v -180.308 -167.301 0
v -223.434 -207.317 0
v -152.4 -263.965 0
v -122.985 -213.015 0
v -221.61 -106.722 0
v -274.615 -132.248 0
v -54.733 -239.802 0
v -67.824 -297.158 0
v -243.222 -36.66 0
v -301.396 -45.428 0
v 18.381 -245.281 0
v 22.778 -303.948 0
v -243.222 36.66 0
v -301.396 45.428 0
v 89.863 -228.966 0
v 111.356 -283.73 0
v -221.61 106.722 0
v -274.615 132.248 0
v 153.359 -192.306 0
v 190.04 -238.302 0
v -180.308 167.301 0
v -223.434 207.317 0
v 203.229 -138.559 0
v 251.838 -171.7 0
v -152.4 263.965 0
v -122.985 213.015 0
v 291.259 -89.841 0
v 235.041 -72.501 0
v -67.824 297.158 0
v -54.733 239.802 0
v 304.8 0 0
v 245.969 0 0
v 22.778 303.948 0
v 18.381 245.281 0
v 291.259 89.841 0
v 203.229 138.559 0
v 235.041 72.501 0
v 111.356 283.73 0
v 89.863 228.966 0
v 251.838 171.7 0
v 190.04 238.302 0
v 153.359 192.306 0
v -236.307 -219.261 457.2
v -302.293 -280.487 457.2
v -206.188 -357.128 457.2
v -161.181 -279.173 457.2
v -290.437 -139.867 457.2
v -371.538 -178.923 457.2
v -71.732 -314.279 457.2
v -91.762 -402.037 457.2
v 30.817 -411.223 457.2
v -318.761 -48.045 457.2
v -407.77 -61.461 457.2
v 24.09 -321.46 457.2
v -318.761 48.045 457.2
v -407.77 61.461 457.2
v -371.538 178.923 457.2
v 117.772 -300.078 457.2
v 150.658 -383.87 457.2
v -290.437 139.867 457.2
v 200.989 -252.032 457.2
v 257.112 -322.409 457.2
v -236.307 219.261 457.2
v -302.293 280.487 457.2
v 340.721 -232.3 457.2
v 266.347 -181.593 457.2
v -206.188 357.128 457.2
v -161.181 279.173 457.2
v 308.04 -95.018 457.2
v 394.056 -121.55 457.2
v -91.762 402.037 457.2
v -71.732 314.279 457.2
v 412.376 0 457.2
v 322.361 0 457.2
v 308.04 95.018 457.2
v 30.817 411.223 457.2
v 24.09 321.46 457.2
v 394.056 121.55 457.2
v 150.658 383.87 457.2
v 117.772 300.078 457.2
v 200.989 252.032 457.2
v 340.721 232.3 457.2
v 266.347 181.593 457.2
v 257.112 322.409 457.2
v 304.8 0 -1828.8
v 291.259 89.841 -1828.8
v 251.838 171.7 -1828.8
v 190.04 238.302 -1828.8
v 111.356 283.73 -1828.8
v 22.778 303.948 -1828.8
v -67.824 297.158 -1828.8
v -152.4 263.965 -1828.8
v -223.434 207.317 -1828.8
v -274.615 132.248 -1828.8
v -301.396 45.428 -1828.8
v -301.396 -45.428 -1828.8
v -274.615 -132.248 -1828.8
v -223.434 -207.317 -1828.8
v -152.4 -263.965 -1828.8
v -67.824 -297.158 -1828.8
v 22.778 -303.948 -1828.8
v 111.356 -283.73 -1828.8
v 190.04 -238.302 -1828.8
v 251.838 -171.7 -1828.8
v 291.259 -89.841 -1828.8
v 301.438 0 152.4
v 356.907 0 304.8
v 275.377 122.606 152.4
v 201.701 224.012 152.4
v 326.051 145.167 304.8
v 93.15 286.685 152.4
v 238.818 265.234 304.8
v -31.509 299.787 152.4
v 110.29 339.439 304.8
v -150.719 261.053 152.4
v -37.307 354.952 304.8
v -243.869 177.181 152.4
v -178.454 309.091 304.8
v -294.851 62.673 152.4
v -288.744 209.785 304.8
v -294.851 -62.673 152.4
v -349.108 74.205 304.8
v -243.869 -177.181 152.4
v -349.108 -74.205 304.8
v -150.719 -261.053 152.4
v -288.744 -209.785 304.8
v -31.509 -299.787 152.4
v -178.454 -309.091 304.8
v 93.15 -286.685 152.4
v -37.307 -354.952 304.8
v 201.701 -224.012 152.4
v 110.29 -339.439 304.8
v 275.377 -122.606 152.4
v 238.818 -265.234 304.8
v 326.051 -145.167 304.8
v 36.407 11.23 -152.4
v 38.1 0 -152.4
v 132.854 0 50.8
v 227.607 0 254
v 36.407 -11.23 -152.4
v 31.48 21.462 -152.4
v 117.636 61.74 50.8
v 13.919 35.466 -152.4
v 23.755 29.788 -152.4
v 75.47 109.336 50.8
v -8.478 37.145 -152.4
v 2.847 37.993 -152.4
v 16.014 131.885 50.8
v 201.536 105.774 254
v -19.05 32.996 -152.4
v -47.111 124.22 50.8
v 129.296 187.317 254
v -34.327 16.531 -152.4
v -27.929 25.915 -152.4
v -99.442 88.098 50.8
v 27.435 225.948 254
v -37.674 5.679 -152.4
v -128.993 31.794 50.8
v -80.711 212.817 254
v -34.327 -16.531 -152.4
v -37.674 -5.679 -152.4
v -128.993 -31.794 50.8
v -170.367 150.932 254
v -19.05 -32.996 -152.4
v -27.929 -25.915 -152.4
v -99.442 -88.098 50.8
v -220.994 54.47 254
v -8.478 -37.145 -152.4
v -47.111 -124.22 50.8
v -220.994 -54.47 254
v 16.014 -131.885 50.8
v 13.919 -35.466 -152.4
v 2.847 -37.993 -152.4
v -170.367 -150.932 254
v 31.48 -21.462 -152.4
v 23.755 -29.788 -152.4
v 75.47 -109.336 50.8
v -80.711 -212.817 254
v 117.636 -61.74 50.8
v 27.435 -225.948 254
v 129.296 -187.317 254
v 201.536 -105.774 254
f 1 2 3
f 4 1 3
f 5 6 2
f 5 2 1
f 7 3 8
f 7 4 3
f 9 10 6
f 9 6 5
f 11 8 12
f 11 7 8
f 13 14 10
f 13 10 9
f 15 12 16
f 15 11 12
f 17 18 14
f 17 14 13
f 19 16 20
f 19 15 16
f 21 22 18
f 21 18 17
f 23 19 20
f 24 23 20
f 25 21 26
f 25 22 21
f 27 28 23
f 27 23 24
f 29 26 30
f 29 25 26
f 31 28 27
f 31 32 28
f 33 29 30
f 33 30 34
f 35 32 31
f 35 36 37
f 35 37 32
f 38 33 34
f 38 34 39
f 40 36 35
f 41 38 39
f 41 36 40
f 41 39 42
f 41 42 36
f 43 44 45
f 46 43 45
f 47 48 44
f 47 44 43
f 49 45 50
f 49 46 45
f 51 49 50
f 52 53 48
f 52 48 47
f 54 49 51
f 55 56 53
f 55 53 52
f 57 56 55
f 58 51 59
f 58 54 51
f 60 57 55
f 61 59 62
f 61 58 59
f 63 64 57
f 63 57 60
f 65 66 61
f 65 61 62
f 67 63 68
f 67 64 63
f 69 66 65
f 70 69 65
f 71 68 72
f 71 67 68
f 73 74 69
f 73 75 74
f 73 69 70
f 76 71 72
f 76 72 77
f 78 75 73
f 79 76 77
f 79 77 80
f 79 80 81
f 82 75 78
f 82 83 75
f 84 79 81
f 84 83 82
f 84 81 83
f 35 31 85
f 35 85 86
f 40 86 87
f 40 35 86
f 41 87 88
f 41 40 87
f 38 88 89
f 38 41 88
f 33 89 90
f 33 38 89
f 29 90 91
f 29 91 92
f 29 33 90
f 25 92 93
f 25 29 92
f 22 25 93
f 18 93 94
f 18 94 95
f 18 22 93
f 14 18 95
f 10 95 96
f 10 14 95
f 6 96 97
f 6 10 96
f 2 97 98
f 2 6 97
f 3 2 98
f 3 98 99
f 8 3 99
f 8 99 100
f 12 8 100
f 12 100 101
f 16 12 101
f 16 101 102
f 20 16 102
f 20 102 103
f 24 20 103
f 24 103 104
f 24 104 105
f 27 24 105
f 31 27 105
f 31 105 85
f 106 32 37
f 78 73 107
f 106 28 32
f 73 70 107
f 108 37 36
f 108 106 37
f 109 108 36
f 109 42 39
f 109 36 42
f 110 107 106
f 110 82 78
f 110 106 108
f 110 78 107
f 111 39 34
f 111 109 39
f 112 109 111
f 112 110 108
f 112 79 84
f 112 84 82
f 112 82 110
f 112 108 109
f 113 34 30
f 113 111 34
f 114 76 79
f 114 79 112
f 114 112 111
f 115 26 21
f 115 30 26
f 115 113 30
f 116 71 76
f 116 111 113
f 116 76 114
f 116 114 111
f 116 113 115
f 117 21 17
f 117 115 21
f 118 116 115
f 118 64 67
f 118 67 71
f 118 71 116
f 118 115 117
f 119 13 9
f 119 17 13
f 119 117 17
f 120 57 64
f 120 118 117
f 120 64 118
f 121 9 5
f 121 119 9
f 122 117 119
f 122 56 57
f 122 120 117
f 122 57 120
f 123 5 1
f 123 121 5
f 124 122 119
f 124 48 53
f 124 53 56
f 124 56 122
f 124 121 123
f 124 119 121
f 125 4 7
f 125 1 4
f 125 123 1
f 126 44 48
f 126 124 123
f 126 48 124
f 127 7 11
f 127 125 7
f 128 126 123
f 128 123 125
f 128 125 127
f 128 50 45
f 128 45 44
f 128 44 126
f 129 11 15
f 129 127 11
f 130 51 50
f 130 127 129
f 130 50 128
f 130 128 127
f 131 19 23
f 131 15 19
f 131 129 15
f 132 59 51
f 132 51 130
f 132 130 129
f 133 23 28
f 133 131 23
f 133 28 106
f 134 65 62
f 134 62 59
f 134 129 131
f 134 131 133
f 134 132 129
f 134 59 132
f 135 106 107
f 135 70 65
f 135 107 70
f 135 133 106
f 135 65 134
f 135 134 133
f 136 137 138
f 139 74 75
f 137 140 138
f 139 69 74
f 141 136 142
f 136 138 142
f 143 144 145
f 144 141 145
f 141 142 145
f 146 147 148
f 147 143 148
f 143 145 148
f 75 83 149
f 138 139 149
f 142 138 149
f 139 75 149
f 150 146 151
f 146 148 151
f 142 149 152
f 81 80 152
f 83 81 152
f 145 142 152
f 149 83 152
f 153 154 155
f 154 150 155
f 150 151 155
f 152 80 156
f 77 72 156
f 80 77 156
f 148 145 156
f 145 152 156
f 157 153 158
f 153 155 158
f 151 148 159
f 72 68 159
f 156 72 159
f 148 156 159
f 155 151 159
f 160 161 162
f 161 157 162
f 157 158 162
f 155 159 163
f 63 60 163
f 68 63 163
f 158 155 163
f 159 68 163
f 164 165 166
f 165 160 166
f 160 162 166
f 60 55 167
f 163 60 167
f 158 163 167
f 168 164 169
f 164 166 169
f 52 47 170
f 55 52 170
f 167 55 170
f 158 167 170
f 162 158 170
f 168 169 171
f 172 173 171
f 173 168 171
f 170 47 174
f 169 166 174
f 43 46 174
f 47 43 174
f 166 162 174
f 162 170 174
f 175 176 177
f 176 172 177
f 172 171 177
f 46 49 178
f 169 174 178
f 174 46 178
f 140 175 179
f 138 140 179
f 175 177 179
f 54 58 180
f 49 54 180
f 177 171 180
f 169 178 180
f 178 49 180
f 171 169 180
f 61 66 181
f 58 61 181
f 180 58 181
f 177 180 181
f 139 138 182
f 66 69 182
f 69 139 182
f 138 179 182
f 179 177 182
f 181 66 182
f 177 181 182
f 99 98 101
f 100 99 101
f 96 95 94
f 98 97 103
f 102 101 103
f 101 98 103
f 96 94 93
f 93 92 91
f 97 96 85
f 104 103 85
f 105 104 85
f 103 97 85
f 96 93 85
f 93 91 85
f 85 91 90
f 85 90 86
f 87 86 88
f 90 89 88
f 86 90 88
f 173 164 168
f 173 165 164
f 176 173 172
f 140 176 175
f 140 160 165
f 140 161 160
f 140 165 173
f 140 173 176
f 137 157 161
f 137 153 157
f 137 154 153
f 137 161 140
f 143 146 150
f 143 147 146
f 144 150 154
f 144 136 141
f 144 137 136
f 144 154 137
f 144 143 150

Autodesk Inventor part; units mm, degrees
ref_plane "YZ Plane" through (0, 0, 0) normal (1, 0, 0) x (0, 1, 0)
ref_plane "XZ Plane" through (0, 0, 0) normal (0, 1, 0) x (-1, 0, 0)
sketch "Sketch1" plane through (0, 0, 0) normal (0, 0, 1) x (1, 0, 0)
  circle A0 centre (0, 0) radius 304.8
  dimension "d0" = 609.6
extrude "Extrusion1" add sketch "Sketch1" against normal blind 1828.8
ref_plane "Work Plane1" through (0, 0, -152.4) normal (0, 0, 1) x (1, 0, 0)
sketch "Sketch2" plane through (0, 0, -152.4) normal (0, 0, 1) x (1, 0, 0)
  circle A0 centre (0, 0) radius 190.5
  dimension "d4" = 381
extrude "Extrusion2" add sketch "Sketch2" along normal blind 609.6 draft 20
sketch "Sketch4" plane through (0, 0, -152.4) normal (0, 0, 1) x (1, 0, 0)
  circle A0 centre (0, 0) radius 38.1
  dimension "d7" = 76.2
extrude "Extrusion3" cut sketch "Sketch4" along normal blind 609.6 draft 25
properties part number "sep_motors"
